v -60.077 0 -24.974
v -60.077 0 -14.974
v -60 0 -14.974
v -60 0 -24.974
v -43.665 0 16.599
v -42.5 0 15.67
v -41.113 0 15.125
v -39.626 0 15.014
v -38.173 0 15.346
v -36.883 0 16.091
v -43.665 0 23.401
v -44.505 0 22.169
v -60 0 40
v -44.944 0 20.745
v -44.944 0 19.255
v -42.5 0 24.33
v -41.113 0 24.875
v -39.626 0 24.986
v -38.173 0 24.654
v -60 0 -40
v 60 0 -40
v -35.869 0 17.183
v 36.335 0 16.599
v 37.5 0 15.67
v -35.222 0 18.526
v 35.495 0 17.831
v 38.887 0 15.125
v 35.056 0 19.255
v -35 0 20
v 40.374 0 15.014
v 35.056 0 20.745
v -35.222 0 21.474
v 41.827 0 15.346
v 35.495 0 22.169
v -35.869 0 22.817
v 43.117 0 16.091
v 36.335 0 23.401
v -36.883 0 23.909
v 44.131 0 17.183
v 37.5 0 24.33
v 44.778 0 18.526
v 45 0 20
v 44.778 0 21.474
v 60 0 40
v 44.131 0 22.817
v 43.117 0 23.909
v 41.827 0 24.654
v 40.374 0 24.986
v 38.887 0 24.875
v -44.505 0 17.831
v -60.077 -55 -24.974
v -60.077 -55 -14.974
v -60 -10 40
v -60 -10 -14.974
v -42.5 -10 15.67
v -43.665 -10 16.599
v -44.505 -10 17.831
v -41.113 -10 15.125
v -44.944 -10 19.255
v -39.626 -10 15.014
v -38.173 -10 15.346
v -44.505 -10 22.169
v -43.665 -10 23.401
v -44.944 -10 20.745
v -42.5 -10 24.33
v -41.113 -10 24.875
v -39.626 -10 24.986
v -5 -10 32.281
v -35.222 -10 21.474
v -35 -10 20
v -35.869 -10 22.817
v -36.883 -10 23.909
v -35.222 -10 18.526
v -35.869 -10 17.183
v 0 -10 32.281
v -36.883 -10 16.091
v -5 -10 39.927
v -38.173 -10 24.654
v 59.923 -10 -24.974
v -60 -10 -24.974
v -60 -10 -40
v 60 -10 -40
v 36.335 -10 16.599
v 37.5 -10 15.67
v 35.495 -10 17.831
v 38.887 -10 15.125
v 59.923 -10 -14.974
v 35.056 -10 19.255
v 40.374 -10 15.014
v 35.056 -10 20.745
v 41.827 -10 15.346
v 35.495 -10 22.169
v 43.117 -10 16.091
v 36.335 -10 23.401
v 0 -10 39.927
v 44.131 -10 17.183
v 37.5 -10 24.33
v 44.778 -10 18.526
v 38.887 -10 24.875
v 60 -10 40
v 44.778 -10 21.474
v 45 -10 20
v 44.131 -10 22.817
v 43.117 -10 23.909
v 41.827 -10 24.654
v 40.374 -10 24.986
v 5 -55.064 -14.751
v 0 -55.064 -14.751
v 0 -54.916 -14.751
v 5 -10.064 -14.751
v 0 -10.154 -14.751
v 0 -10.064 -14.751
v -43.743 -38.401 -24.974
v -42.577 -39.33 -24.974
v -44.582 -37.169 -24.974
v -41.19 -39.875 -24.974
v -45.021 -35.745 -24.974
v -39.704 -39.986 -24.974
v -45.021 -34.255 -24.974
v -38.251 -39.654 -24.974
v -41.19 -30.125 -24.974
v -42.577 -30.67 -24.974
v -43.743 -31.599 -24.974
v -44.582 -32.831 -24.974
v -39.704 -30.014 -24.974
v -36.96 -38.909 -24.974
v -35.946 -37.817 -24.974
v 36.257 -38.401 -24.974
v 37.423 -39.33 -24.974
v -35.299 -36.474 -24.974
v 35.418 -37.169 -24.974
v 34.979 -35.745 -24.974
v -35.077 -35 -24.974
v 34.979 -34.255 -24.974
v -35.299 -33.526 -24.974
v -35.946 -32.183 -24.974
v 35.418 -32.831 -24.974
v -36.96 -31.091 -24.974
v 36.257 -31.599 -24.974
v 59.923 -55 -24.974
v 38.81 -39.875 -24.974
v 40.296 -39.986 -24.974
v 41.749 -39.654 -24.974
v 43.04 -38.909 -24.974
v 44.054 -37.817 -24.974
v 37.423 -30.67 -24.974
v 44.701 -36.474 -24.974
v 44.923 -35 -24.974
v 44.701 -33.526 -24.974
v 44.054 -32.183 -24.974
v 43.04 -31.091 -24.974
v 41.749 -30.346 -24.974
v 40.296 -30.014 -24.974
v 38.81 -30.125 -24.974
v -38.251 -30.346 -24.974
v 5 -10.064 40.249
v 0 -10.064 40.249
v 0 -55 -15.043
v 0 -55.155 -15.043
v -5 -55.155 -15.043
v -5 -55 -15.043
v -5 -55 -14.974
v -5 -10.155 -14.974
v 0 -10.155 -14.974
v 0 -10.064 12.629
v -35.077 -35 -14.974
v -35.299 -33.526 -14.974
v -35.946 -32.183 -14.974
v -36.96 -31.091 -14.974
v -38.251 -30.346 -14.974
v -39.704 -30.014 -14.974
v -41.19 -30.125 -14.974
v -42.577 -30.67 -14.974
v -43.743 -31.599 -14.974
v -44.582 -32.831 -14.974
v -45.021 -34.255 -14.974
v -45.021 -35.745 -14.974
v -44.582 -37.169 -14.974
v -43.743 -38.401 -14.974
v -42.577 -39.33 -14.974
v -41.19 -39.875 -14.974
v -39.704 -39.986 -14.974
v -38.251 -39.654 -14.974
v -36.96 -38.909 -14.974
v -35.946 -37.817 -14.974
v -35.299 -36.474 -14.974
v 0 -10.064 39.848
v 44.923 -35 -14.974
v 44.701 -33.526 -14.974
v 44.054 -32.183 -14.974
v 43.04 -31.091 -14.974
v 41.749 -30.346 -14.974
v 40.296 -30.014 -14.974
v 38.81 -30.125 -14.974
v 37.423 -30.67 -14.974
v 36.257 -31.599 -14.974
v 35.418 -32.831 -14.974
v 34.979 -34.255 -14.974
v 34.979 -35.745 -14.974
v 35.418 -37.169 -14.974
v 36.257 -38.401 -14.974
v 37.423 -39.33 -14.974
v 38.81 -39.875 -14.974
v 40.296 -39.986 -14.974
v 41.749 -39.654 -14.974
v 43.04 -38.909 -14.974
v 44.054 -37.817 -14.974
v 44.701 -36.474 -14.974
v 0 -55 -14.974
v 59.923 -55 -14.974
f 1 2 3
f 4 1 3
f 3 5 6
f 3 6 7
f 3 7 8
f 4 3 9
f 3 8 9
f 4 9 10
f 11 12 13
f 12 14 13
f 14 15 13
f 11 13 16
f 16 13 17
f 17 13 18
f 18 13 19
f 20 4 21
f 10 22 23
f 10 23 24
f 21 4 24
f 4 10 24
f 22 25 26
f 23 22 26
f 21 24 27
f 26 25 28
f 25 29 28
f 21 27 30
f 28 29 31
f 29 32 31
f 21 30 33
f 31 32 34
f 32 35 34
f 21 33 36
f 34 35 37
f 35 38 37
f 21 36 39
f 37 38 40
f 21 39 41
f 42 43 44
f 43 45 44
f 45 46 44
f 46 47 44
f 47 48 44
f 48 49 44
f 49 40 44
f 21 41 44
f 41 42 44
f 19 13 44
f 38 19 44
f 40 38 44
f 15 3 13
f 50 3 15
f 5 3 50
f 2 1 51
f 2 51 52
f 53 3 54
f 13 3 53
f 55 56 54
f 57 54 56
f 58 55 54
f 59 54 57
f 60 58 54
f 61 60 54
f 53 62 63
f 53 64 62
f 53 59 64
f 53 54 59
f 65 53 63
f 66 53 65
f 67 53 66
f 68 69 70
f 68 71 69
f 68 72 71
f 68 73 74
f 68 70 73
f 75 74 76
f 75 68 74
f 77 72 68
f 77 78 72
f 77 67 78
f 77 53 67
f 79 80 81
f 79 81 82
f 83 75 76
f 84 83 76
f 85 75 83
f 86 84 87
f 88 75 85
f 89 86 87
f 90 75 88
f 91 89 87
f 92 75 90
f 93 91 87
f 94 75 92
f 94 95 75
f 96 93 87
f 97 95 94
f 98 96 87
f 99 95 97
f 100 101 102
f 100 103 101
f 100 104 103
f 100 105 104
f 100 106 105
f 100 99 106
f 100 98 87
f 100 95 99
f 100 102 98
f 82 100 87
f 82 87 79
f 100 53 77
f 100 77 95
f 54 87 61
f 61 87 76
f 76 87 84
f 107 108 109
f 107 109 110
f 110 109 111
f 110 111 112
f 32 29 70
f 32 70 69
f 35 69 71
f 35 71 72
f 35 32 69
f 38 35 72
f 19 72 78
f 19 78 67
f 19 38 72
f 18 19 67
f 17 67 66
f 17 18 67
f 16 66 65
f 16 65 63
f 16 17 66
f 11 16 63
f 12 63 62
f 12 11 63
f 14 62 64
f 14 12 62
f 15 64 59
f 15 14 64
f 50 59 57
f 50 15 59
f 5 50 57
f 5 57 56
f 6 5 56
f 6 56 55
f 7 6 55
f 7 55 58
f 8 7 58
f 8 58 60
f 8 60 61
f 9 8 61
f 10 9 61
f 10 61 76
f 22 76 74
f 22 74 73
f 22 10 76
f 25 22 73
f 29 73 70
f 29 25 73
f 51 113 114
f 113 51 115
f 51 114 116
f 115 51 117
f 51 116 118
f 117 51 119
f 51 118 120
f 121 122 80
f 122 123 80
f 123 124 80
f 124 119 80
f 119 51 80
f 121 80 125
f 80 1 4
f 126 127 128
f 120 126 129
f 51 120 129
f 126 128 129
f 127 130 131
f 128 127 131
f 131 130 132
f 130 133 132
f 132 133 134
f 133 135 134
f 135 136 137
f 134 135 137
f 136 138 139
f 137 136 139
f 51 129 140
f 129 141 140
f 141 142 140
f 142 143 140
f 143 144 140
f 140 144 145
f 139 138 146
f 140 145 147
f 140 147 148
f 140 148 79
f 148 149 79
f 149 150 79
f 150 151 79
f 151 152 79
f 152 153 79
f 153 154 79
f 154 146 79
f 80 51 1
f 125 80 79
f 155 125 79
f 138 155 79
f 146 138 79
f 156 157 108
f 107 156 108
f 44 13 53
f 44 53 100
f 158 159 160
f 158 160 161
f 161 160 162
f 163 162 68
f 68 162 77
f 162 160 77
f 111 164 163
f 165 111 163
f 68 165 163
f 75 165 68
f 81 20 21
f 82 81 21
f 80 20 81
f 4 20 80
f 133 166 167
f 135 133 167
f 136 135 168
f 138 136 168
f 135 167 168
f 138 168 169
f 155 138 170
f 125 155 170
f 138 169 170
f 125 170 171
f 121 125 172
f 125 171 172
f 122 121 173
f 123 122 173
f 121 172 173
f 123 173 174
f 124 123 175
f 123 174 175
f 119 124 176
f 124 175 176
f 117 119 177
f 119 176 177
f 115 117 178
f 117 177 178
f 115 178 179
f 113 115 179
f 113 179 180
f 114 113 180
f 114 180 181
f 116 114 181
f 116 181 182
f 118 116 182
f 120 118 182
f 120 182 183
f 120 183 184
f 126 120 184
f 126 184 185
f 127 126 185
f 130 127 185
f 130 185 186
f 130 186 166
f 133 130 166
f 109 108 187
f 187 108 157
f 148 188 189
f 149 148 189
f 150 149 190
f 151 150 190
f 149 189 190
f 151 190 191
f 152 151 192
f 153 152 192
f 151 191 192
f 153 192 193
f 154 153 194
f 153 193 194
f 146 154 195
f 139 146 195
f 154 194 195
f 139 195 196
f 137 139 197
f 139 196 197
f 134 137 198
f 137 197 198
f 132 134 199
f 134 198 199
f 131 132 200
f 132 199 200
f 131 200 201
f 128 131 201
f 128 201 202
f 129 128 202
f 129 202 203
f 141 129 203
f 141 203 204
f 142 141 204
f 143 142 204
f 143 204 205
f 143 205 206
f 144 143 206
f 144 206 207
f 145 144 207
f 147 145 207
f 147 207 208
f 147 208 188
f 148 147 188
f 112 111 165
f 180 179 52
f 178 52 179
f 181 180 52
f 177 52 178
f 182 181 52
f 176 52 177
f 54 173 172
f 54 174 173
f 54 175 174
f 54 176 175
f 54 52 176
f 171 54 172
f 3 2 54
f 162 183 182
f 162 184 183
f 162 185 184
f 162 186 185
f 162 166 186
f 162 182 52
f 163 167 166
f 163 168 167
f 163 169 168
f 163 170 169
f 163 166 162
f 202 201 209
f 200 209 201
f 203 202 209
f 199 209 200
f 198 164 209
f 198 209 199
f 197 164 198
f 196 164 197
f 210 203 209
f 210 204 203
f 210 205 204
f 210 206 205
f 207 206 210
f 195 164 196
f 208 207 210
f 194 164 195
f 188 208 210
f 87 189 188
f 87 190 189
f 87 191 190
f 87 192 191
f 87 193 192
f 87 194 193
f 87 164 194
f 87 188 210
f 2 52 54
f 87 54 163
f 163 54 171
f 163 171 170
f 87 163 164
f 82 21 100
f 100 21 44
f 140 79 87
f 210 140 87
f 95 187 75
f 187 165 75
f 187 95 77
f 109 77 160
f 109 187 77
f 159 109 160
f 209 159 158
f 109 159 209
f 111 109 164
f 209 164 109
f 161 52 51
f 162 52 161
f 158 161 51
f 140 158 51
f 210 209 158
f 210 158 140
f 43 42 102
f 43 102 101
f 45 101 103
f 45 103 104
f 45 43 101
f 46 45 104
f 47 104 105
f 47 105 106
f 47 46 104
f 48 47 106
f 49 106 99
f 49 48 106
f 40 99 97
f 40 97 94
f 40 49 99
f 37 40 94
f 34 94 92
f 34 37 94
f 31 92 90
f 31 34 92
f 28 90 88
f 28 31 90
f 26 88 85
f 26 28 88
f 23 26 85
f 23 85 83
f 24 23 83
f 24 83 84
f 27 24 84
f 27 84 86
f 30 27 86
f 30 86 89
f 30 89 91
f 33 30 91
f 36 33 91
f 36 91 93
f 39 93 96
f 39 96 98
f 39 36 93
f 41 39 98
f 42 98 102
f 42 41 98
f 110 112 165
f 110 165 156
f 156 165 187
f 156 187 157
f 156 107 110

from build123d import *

# Parameters (mm, degrees)
F0_W     = 120
F0_H     = 80
F0_R     = 5
F1_DEPTH = 10
F2_W     = 120
F2_H     = 10
F3_DEPTH = 55
F4_R     = 5
F5_DEPTH = 25
F7_DEPTH = 5
F9_DEPTH = 5


with BuildPart() as f1:
    # F0 (on Front) → F1 (new body)
    with BuildSketch(Plane.XZ):
        Rectangle(F0_W, F0_H)
        with Locations((-40, 20)):
            Circle(F0_R, mode=Mode.SUBTRACT)
        with Locations((40, 20)):
            Circle(F0_R, mode=Mode.SUBTRACT)
    extrude(amount=F1_DEPTH)

    # F2 (on Front) → F3 (join)
    with BuildSketch(Plane.XZ):
        with Locations((-0.077325, -19.974228)):
            Rectangle(F2_W, F2_H)
    extrude(amount=F3_DEPTH)

    # F4 (on face) → F5 (cut)
    with BuildSketch(Plane.XY.offset(-14.974228)):
        with Locations((-40.077325, -35)):
            Circle(F4_R)
        with Locations((39.922675, -35)):
            Circle(F4_R)
    extrude(amount=-F5_DEPTH, mode=Mode.SUBTRACT)

    # F6 (on Right) → F7 (join)
    with BuildSketch(Plane.YZ):
        Polygon((-10.15516, -15.042505), (-9.974833, 39.9572), (-55.15516, -15.042505), align=None)
    extrude(amount=-F7_DEPTH)

    # F8 (on Right) → F9 (join)
    with BuildSketch(Plane.YZ):
        Polygon((-10.064434, -14.750807), (-10.064434, 40.249193), (-55.064434, -14.750807), align=None)
    extrude(amount=F9_DEPTH)


solid = f1.part
